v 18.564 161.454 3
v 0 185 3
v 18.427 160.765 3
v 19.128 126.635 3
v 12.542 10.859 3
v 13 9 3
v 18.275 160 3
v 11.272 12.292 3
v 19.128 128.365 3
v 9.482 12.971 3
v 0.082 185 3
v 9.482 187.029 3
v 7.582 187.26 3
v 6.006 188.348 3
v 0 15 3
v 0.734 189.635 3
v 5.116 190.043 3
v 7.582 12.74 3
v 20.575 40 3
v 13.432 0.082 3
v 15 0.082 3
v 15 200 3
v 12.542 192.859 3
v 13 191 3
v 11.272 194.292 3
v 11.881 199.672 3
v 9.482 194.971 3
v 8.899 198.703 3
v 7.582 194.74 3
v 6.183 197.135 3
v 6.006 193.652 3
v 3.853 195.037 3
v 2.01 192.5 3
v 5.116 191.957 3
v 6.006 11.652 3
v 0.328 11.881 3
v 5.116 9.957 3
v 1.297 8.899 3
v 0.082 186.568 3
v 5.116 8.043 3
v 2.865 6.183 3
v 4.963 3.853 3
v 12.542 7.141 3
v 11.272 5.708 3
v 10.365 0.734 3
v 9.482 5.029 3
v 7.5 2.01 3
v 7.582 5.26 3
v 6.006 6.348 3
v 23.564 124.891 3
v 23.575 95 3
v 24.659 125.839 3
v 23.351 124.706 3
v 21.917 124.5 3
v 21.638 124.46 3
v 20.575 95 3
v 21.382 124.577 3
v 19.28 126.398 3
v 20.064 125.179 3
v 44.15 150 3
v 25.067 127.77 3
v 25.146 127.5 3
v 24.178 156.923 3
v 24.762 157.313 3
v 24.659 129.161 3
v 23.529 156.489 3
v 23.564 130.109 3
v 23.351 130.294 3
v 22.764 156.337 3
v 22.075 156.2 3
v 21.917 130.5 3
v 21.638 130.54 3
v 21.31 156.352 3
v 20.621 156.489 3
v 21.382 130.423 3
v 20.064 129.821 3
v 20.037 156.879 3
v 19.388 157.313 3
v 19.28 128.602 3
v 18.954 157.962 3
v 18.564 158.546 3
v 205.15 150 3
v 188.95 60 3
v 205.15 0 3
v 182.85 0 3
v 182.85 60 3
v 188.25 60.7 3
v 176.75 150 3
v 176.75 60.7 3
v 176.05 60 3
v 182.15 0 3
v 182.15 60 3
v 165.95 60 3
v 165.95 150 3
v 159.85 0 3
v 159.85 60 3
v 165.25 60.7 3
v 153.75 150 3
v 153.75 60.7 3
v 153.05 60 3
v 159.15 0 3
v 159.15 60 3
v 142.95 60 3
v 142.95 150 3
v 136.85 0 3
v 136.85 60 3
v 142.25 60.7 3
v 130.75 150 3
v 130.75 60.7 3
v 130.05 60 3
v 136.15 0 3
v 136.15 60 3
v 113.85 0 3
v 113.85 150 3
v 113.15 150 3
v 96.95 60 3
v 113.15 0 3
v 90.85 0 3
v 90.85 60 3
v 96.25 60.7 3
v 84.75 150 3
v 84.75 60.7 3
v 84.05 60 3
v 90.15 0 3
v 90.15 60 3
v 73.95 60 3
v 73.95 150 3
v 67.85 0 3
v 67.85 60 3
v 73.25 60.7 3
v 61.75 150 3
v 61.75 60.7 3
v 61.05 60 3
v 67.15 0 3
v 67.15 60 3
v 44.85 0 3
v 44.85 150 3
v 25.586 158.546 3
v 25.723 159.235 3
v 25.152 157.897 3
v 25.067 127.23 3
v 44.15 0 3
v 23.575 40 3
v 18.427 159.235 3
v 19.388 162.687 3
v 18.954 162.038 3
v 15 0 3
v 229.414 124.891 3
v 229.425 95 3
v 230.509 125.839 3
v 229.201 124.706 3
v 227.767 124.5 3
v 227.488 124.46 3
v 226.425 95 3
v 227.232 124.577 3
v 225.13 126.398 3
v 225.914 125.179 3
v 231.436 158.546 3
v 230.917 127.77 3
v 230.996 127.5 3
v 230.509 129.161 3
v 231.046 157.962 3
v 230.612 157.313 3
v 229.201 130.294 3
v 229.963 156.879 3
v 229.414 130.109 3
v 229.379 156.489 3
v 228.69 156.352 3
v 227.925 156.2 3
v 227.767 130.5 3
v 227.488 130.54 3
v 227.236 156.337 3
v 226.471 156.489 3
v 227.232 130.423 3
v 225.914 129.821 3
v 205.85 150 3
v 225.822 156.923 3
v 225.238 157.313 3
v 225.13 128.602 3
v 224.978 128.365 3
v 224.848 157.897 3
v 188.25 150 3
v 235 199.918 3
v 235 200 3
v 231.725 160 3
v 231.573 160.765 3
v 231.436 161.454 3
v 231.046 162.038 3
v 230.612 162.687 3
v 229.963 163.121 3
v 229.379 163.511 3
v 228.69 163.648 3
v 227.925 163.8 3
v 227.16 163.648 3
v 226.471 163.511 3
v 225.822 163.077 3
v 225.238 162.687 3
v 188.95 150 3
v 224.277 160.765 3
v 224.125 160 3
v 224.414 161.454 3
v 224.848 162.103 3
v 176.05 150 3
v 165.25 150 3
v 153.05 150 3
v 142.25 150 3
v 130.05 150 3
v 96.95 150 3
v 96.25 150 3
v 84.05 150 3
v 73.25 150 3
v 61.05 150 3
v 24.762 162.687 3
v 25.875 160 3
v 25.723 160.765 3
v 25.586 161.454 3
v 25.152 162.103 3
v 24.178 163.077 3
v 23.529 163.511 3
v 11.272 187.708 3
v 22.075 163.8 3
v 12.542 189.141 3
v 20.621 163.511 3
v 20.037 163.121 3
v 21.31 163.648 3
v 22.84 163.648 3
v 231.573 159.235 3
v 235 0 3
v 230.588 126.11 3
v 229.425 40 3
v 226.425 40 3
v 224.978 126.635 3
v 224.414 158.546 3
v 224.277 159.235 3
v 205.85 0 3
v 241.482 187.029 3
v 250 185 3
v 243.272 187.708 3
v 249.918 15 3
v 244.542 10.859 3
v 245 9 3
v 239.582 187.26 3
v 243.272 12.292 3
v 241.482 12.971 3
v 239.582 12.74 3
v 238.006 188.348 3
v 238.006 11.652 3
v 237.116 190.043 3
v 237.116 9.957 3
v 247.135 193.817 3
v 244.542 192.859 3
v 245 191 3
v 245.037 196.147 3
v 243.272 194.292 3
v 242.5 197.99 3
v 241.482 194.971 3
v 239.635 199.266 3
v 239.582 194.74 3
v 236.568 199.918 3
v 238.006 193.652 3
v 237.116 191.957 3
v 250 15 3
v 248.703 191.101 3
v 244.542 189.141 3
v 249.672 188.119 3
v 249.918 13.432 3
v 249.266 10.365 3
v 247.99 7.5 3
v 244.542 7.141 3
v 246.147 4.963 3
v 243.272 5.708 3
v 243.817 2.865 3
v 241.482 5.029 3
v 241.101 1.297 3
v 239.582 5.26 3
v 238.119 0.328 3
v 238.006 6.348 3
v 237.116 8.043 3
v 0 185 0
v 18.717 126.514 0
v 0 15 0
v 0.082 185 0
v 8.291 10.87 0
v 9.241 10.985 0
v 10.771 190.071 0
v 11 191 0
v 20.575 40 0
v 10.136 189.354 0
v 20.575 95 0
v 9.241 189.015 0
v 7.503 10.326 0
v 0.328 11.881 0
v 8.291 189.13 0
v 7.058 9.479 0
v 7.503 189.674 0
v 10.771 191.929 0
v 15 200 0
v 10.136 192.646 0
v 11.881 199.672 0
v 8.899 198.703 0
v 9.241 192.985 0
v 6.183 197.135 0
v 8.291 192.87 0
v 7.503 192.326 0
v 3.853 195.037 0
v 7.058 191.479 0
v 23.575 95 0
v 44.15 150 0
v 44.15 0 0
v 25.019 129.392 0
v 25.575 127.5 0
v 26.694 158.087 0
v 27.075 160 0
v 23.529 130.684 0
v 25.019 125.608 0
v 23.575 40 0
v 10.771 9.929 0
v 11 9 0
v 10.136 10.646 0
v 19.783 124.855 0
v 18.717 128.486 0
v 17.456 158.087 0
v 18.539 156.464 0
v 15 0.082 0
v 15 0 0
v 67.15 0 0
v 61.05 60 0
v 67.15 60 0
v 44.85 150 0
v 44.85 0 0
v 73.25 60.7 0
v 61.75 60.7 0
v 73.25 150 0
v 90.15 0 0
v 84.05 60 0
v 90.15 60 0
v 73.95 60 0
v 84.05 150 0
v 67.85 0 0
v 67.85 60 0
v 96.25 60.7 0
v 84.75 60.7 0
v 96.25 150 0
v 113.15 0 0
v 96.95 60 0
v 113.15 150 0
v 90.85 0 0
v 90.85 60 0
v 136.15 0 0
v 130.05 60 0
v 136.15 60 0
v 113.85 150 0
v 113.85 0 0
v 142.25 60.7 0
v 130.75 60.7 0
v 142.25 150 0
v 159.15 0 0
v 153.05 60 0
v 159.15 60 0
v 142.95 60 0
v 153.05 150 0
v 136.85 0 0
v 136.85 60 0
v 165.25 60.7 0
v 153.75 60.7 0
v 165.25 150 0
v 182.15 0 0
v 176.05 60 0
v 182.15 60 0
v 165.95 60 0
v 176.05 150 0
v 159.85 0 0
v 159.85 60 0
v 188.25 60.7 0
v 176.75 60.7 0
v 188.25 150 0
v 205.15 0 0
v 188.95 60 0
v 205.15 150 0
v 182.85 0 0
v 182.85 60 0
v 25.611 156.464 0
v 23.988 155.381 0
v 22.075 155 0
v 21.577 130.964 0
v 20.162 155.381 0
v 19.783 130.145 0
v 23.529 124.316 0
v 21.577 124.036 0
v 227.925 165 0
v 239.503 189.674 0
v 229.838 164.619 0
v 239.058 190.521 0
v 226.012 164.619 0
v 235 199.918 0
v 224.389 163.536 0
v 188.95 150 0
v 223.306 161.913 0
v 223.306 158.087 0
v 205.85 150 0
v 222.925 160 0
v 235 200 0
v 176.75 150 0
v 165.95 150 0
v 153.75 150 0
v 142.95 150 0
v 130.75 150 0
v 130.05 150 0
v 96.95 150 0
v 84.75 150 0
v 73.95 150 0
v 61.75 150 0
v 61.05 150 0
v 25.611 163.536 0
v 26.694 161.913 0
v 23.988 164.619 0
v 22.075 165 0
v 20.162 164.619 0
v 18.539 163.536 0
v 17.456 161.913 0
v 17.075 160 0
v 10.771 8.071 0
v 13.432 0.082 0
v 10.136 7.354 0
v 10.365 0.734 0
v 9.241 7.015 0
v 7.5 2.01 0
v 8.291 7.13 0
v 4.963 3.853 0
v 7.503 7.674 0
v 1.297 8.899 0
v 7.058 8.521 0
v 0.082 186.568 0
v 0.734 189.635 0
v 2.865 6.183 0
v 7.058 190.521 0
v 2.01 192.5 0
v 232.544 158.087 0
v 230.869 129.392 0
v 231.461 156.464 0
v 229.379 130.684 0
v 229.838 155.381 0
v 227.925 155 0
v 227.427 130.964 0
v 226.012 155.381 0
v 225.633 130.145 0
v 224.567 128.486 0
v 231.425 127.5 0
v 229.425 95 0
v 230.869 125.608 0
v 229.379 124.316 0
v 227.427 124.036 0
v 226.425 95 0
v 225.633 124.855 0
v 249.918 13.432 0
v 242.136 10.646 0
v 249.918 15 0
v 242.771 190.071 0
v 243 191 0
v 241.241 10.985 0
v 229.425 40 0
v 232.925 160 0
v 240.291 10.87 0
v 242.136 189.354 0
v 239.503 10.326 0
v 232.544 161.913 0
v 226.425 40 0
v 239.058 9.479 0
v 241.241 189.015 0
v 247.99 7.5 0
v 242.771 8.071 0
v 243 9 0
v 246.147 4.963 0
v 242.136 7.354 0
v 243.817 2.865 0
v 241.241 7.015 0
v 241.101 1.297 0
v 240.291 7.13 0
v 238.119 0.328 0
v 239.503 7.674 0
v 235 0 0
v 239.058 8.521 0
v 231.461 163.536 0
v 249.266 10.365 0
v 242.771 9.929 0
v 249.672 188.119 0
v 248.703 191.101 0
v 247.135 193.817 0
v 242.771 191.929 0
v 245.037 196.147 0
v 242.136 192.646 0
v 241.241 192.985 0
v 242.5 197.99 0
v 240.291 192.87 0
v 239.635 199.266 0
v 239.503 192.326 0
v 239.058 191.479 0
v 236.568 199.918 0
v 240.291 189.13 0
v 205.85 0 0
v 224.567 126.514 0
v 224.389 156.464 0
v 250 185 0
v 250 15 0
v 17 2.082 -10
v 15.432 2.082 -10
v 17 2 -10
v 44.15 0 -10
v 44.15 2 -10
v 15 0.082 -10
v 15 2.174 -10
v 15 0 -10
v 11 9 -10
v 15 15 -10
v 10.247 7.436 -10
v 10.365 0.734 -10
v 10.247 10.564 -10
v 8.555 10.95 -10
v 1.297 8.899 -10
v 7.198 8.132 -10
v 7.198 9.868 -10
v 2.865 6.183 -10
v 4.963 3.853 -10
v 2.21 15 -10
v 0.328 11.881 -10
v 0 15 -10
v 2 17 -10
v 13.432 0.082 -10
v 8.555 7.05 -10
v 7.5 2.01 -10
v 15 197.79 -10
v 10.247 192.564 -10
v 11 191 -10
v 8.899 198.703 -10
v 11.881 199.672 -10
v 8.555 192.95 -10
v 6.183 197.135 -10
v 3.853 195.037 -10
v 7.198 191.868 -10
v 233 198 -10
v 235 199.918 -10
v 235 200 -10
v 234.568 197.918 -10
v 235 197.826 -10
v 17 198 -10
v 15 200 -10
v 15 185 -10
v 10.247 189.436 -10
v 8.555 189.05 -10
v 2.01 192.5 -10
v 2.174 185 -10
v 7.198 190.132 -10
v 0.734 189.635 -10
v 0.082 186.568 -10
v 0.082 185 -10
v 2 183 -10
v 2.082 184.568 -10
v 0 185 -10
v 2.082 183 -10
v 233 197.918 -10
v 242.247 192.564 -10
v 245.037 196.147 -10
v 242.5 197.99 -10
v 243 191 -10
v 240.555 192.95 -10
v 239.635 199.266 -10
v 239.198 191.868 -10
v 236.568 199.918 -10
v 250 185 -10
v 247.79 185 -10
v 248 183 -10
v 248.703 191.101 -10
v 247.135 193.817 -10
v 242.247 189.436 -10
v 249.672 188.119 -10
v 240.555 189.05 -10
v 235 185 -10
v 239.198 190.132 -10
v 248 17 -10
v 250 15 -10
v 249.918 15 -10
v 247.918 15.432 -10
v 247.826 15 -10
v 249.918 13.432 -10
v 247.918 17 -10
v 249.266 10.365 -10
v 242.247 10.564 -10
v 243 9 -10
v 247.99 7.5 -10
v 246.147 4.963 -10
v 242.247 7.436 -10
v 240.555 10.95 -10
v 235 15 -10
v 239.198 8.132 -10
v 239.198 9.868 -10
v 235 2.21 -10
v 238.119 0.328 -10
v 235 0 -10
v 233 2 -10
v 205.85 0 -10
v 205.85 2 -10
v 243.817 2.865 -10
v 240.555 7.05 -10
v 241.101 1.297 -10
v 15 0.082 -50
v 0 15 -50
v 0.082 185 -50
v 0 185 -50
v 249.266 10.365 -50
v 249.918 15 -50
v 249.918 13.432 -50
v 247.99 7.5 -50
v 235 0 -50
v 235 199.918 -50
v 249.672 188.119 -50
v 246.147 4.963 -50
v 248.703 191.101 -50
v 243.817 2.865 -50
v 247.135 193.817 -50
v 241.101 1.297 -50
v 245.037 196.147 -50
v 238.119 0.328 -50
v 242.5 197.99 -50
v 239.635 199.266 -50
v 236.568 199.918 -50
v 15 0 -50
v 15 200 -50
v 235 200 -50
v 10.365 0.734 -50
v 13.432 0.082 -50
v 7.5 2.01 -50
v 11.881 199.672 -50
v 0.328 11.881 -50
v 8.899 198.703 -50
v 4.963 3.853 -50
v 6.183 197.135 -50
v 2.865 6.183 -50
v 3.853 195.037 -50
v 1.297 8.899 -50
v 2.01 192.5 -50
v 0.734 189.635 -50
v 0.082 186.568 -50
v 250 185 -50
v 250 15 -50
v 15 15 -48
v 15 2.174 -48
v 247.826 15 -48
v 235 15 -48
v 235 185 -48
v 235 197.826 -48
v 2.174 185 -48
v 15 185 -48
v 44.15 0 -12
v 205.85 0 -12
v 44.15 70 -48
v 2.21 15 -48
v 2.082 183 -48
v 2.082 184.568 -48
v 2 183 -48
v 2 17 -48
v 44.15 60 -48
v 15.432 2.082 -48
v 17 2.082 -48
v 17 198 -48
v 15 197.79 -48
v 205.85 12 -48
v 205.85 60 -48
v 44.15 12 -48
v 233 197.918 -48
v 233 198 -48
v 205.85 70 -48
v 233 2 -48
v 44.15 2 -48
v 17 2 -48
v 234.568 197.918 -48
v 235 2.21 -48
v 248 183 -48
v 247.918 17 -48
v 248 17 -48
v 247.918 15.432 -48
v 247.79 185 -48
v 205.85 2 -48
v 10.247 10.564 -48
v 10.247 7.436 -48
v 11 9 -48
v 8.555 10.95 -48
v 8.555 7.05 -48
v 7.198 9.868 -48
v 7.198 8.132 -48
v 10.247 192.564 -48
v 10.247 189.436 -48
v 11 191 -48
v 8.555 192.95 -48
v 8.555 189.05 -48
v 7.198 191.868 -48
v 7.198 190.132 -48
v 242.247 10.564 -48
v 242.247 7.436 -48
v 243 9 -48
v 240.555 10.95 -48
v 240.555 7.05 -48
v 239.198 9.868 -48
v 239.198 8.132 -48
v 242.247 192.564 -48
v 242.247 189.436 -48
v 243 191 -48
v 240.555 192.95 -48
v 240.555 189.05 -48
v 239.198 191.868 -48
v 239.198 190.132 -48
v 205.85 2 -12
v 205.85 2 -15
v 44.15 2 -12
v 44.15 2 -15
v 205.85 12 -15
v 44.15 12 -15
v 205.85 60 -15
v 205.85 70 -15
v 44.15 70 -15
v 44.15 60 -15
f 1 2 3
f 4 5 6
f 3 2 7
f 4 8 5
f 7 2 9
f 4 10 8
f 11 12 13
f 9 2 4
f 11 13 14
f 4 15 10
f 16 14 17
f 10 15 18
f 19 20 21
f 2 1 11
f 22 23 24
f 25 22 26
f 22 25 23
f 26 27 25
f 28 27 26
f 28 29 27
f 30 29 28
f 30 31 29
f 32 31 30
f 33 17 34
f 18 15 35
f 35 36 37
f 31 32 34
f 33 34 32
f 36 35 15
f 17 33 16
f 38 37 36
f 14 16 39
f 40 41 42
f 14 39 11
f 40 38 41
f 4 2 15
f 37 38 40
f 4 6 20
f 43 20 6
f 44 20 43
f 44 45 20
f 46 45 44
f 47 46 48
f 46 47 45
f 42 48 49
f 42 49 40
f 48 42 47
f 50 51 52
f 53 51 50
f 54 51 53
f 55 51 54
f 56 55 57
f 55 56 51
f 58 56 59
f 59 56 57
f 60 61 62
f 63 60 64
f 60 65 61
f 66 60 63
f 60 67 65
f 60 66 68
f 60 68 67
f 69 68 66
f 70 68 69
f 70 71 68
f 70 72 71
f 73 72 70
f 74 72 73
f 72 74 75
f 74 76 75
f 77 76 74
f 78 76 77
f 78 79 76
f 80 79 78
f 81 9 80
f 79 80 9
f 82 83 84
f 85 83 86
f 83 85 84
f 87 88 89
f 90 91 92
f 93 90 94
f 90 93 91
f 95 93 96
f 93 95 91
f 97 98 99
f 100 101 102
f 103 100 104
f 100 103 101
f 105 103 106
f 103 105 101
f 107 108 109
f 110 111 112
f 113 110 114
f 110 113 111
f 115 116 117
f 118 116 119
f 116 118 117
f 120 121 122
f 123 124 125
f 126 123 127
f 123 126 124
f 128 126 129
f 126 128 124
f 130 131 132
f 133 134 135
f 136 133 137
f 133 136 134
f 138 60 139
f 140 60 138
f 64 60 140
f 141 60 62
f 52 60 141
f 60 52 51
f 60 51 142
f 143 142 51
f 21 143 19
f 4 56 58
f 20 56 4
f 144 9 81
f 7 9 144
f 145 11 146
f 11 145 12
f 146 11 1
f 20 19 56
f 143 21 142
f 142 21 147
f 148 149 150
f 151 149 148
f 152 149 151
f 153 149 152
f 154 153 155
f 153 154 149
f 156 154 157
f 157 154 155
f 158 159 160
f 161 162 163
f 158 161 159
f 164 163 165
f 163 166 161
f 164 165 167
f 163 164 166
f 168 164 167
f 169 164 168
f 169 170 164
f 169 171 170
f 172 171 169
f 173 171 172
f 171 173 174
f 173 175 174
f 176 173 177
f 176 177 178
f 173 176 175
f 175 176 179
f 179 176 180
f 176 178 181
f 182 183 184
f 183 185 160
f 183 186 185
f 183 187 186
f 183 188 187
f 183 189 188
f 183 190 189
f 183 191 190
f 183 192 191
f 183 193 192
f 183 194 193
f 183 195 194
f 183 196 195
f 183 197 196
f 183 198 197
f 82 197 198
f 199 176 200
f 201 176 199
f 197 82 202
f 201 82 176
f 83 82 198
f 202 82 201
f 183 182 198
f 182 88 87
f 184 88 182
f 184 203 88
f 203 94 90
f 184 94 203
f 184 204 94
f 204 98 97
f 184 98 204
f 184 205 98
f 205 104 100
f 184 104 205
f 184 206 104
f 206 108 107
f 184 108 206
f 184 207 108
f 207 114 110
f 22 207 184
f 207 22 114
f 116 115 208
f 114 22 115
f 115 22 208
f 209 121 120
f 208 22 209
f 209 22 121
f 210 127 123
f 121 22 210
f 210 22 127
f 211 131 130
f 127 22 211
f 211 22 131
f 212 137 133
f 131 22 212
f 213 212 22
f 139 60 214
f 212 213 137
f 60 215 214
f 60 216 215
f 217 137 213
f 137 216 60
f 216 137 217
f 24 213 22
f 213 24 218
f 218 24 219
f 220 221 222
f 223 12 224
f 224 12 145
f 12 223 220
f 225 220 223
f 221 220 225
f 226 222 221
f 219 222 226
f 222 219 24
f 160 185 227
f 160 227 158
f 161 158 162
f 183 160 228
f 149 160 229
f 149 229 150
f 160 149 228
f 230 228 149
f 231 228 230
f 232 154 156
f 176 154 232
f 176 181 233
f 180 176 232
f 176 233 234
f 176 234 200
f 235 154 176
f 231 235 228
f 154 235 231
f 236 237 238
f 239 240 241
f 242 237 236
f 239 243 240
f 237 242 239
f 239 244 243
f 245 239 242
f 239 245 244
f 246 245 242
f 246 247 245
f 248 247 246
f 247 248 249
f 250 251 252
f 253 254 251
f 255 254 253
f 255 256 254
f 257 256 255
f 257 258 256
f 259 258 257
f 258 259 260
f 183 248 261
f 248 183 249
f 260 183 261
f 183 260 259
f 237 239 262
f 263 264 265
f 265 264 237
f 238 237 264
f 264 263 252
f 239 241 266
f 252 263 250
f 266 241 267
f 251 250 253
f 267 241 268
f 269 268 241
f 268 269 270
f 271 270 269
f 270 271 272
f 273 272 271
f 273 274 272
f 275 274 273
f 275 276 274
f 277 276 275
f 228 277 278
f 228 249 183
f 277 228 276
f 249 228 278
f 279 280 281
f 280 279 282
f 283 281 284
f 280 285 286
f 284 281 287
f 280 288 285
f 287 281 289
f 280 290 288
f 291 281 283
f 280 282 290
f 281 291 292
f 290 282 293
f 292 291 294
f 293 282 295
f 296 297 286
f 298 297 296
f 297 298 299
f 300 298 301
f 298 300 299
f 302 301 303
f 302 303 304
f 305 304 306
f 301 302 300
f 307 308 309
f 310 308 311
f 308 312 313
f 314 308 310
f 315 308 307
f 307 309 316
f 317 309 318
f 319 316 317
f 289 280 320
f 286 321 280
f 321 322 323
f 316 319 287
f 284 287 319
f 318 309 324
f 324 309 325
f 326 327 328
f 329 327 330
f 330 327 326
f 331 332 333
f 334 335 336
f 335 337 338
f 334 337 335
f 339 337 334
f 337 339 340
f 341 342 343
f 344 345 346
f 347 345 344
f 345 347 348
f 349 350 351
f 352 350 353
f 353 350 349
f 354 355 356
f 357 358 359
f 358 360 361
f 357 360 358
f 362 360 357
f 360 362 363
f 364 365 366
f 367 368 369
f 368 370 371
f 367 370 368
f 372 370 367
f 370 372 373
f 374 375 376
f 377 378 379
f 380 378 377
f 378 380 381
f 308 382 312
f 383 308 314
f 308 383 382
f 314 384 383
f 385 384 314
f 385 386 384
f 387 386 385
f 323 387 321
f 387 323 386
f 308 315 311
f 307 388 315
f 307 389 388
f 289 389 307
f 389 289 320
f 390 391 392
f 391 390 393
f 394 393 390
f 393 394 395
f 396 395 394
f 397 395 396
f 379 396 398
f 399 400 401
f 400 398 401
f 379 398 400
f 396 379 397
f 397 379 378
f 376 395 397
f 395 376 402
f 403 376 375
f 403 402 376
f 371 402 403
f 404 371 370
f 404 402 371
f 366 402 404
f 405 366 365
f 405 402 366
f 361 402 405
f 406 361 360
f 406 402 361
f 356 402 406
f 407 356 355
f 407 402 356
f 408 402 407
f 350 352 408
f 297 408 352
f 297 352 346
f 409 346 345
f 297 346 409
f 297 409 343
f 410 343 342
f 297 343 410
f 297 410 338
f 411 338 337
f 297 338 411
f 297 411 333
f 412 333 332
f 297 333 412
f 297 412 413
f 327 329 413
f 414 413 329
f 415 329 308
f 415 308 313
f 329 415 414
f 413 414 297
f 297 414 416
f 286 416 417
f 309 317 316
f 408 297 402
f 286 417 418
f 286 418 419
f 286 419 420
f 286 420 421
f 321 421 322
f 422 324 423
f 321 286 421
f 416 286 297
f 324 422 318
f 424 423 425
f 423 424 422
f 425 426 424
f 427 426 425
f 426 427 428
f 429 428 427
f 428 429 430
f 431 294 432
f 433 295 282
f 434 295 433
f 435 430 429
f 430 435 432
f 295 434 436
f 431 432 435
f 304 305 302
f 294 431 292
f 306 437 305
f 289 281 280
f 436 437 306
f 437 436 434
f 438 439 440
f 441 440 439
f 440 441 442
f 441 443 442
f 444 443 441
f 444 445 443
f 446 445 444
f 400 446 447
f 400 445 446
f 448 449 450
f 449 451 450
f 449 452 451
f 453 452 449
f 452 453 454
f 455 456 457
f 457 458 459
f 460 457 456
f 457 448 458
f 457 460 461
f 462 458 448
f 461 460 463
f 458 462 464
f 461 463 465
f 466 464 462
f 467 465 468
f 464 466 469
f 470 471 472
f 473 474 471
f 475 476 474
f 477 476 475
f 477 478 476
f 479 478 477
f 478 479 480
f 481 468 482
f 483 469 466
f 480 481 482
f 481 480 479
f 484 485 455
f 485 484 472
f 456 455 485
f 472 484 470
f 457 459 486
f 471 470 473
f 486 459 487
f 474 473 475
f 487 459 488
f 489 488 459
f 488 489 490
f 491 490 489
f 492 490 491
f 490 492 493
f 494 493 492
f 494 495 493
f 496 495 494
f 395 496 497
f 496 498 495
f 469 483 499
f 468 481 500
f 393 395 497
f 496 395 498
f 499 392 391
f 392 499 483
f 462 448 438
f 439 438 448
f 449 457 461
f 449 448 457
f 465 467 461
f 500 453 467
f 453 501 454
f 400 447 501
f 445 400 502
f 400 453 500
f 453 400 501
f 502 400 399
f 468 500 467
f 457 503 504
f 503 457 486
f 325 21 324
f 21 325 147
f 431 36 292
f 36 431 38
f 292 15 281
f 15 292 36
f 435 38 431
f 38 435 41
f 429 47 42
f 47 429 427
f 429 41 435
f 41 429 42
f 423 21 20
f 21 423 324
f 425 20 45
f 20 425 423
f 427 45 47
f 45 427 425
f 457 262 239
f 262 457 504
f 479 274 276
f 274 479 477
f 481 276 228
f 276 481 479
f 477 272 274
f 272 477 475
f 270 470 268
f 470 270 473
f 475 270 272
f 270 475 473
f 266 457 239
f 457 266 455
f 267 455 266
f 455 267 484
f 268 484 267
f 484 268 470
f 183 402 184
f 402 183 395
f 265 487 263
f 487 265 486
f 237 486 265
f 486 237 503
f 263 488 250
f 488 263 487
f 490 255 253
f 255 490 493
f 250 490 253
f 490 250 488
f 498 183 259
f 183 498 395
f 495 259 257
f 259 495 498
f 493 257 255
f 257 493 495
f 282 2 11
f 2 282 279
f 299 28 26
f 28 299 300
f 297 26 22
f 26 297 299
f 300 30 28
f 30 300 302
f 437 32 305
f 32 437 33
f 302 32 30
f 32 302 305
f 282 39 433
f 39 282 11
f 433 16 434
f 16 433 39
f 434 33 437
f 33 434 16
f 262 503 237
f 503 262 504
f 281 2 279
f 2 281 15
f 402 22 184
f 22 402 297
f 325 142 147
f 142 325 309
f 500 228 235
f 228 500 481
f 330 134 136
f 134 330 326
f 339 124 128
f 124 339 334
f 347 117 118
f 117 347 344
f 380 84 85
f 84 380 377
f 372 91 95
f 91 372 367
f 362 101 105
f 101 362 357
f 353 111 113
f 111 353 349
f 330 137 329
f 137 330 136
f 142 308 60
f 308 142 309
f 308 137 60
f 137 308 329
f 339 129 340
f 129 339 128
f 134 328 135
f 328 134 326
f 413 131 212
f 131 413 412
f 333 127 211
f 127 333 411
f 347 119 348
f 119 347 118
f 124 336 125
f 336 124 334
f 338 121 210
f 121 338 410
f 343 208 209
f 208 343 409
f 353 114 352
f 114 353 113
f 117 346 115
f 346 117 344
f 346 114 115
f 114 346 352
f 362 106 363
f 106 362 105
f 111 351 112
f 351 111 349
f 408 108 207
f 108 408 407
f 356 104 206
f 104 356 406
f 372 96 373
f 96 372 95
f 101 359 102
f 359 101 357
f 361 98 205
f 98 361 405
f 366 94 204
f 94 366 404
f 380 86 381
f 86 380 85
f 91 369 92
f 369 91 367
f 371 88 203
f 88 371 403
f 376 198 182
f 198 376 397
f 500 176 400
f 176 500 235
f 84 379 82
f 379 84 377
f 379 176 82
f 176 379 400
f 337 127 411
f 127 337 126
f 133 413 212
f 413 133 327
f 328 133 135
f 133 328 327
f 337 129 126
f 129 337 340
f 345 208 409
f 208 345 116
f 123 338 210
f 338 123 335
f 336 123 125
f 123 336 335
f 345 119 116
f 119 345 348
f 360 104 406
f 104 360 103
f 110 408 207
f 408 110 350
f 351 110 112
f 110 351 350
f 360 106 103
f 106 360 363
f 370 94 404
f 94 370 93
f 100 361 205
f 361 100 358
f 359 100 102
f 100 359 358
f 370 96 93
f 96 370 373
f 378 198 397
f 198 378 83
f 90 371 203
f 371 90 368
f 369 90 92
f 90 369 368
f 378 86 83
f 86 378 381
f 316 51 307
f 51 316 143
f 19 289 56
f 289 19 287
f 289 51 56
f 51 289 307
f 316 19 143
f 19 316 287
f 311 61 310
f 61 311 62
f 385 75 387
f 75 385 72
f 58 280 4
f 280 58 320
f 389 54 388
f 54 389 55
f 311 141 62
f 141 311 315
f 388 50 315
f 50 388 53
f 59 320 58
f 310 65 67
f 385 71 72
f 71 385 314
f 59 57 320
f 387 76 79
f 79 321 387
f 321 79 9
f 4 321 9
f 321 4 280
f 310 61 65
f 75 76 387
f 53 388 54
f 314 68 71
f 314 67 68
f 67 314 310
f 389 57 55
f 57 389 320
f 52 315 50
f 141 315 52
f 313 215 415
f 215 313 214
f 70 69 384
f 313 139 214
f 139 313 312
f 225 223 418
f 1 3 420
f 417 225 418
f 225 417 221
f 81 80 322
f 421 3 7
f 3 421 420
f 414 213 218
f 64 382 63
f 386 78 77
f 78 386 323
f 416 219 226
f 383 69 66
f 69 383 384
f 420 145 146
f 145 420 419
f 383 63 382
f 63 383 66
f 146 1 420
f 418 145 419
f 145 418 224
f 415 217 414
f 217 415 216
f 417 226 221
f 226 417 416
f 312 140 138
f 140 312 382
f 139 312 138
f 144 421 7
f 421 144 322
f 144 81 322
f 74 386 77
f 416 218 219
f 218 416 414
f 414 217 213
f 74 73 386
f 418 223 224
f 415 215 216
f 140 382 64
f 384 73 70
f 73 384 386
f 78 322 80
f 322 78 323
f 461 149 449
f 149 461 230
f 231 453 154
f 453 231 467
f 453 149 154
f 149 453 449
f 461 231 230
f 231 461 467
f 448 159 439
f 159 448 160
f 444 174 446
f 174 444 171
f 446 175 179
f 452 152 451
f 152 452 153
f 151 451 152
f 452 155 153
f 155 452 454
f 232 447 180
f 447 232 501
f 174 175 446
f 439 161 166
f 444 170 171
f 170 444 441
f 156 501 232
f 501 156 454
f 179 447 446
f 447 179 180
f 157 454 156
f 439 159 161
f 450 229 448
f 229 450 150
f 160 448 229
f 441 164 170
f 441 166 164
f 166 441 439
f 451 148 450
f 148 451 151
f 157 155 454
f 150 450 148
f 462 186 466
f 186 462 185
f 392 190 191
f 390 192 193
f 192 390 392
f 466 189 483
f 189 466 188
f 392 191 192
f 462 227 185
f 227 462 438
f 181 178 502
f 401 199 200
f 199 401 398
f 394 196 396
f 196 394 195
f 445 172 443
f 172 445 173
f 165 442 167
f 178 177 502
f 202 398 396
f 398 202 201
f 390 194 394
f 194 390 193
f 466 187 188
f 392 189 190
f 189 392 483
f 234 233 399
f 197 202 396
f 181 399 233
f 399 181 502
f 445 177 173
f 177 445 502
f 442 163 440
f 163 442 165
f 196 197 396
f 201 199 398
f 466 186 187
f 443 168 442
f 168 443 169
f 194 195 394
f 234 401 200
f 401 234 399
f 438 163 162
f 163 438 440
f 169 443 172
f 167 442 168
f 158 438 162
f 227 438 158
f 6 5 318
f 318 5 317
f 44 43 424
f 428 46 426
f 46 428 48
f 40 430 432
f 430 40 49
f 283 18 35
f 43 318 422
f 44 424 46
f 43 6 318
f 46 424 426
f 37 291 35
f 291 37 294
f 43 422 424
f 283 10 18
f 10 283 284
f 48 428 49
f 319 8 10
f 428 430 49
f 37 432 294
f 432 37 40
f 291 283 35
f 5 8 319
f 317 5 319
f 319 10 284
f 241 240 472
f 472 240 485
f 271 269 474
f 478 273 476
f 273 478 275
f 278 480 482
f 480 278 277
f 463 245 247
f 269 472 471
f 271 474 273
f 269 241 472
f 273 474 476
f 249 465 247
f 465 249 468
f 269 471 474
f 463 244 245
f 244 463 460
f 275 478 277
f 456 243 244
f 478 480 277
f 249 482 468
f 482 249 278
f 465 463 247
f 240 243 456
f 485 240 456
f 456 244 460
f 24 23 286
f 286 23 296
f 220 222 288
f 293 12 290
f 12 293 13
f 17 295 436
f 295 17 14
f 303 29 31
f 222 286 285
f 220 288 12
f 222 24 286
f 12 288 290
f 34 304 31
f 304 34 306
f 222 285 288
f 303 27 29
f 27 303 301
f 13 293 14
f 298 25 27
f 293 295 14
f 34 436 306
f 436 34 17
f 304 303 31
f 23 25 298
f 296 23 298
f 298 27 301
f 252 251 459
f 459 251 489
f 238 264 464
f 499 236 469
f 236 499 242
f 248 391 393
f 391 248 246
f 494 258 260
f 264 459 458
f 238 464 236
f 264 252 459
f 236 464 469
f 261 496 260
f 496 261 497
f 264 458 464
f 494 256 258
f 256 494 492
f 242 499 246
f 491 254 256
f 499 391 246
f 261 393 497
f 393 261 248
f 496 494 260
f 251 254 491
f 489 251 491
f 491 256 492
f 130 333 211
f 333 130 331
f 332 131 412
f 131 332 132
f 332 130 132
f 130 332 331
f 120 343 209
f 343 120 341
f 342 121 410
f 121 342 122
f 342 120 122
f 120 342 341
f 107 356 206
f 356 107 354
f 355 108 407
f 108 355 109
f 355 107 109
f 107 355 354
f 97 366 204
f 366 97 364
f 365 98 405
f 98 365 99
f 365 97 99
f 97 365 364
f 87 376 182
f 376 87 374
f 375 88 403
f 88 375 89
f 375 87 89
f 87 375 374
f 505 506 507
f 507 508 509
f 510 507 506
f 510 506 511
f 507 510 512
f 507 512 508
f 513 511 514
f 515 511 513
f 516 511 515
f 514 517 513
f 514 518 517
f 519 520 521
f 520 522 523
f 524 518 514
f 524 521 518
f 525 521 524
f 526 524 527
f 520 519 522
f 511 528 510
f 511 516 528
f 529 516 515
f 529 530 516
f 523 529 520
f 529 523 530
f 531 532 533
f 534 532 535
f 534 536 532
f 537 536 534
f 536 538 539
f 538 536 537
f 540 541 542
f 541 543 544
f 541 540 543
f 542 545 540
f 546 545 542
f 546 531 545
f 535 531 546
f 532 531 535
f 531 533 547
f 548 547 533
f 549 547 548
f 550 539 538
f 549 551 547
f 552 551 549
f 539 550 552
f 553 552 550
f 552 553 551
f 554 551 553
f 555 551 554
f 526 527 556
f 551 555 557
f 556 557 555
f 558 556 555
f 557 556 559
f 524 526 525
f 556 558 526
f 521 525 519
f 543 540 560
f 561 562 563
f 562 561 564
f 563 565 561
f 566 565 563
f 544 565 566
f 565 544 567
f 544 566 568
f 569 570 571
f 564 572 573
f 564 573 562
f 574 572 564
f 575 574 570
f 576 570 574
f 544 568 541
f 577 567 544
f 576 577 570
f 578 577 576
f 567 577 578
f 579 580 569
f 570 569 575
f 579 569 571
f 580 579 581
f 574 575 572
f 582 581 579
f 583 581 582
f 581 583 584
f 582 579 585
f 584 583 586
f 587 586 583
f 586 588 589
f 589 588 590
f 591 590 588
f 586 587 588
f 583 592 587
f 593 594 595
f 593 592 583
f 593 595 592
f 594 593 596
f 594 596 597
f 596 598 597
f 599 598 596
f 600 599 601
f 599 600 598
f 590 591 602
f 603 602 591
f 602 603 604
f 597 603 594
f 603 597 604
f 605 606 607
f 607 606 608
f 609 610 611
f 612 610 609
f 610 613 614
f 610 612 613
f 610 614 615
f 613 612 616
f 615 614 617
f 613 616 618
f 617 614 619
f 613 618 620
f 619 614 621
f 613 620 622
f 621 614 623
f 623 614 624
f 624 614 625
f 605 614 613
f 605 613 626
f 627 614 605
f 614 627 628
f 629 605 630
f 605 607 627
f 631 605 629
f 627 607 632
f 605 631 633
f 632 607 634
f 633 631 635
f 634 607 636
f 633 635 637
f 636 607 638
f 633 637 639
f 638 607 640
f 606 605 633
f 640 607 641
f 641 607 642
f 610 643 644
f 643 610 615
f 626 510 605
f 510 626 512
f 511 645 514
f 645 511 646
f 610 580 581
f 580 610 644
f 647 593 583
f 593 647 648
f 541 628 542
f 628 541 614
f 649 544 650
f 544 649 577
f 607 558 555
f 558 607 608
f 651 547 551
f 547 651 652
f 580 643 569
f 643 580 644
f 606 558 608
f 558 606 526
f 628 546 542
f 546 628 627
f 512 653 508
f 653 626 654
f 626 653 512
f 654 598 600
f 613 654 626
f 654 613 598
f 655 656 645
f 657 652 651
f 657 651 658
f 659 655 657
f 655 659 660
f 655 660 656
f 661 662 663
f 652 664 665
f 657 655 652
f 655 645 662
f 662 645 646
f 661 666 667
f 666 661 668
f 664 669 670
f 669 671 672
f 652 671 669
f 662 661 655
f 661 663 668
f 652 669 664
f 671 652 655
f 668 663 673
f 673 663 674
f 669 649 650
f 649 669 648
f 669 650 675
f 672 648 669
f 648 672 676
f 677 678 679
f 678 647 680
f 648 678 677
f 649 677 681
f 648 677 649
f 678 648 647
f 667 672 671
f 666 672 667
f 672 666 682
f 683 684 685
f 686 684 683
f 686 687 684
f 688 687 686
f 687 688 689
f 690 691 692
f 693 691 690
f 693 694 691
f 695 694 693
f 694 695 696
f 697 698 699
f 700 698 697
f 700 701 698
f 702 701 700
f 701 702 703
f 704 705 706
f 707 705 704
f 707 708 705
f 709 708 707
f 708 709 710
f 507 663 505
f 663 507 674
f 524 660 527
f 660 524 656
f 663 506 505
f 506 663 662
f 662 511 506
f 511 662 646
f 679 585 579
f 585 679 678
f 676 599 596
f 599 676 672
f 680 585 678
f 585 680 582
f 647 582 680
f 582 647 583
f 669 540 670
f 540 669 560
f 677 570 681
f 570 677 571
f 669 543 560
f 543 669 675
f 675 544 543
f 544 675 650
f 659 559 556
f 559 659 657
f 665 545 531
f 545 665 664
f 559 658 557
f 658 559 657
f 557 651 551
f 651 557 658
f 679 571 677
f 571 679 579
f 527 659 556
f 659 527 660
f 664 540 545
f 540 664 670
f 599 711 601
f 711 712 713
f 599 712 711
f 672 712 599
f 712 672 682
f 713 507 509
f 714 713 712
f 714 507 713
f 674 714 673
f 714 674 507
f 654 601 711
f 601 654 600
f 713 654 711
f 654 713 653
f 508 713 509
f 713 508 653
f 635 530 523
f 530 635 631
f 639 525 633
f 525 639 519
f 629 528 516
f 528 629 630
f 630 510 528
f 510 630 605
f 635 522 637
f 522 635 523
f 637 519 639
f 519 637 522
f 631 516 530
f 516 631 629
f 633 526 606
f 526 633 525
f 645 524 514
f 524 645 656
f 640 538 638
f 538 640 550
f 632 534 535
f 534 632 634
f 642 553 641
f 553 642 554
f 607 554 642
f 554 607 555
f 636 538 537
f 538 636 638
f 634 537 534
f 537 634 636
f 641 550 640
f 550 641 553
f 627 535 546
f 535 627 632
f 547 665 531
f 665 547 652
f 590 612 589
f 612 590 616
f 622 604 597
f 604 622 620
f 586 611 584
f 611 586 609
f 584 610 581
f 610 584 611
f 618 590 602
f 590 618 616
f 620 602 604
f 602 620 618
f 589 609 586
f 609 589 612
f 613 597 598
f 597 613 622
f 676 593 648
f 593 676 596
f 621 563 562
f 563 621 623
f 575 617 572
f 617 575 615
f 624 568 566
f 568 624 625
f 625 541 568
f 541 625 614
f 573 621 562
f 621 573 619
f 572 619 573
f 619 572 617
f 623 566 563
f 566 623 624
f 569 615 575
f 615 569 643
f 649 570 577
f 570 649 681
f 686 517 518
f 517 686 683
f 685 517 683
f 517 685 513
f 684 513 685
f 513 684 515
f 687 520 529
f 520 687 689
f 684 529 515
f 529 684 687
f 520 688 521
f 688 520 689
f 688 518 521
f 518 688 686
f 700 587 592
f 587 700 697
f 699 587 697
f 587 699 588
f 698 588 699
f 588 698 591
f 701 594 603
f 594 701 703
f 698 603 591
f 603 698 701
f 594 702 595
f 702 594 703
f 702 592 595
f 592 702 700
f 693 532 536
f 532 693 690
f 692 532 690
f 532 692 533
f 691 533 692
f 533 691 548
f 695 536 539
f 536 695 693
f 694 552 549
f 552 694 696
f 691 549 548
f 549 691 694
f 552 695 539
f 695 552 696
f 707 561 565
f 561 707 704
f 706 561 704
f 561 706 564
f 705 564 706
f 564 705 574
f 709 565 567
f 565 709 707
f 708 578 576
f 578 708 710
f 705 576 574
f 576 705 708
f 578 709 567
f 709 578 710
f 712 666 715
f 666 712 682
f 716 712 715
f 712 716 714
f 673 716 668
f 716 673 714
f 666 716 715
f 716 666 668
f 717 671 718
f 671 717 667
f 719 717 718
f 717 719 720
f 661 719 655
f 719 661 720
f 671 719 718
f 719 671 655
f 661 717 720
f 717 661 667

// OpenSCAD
//width
w = 250;
//height (y)
h = 200;
//depth (z)
d = 40;
//strength (thickness of outer walls)
s = 2;

//radius of edges
r = 15;

//screw holder width
sm = 8;
//hole radius
hr = 2;

//key width
kw = 23;
//key length
kl = 150;
//small key length
skl = 90;
//key gap
kg = 0.7;
//key depth (depth of upper plate
kd = 3;

slider_length = 55;

slider_y = 40;
knob_y = (h+slider_length)/2;
knob2_y = h-40;



//margin of keys begin
center_keys_margin = (w-(7*kw)-kg)/2;


//push button height
pbh = 5;

//include <roundedcube.scad>

module myroundedcube(size=[1,1,1],radius=0.5) {
    difference(){    
    cube(size);
    
        translate([radius,radius,0])rotate([0,0,180])difference(){
                cube([radius*2,radius*2,size[2]]);
                cylinder(size[2],radius,radius);
        }
        translate([size[0]-radius,radius,0])rotate([0,0,270])difference(){
                cube([radius*2,radius*2,size[2]]);
                cylinder(size[2],radius,radius);
        }
        translate([size[0]-radius,size[1]-radius,0])rotate([0,0,0])difference(){
                cube([radius*2,radius*2,size[2]]);
                cylinder(size[2],radius,radius);
        }
        translate([radius,size[1]-radius,0])rotate([0,0,90])difference(){
                cube([radius*2,radius*2,size[2]]);
                cylinder(size[2],radius,radius);
        }
        }
        
}


difference(){
//upper plate
myroundedcube([w,h,kd],radius=r);

//cut off big keys
for(i = [0:7])
    translate([center_keys_margin+i*kw,0,0])cube([kg,kl,kd]);

//cut holes for small keys
for(i = [1,2,4,5,6])
    translate([center_keys_margin+i*kw-(kw+2*kg)/4,kl-skl,0])cube([kw/2+2*kg,skl,kd]);


translate([center_keys_margin/2-1.5,slider_y,0]) cube([3,slider_length,kd]);
translate([center_keys_margin/2,knob_y,0]) cylinder(3.5,3.5,kd);
translate([center_keys_margin/2,knob2_y,0]) cylinder(5,5,kd);

translate([w-center_keys_margin/2-1.5,slider_y,0]) cube([3,55,kd]);
translate([w-center_keys_margin/2,knob_y,0]) cylinder(3.5,3.5,kd);
translate([w-center_keys_margin/2,knob2_y,0]) cylinder(5,5,kd);

//holes at the edges
        translate([r*0.6,r*0.6,0])cylinder(kd,hr,hr*2);
        translate([w-r+r*0.4,r*0.6,0])cylinder(kd,hr,hr*2);
        translate([r*0.6,h-r+r*0.4,0])cylinder(kd,hr,hr*2);
        translate([w-r+r*0.4,h-r+r*0.4,0])cylinder(kd,hr,hr*2);

        

}//difference

//small keys
for(i = [1,2,4,5,6])
    translate([center_keys_margin+i*kw-(kw-2*kg)/4,kl-skl+kg,0]) cube([kw/2,skl-kg,kd]);


//bottom
translate([0,0,-d-10]){
    difference(){
        union(){
            myroundedcube([w,h,d],radius=r);
        }
            translate([s,s,s])myroundedcube([w-2*s,h-2*s,d-s],radius=r);
            translate([center_keys_margin,0,d-s]) cube([7*kw+kg,s,s]);
    }
    difference(){
        union(){
            intersection(){translate([r,r,0])cylinder(d,r,r);cube([r,r,d]);}
            translate([0,h,0])rotate([0,0,270])intersection(){translate([r,r,0])cylinder(d,r,r);cube([r,r,d]);}
            translate([w,0,0])rotate([0,0,90])intersection(){translate([r,r,0])cylinder(d,r,r);cube([r,r,d]);}
            translate([w,h,0])rotate([0,0,180])intersection(){translate([r,r,0])cylinder(d,r,r);cube([r,r,d]);}
        }
        translate([r*0.6,r*0.6,0])cylinder(d,hr,hr);
        translate([w-r+r*0.4,r*0.6,0])cylinder(d,hr,hr);
        translate([r*0.6,h-r+r*0.4,0])cylinder(d,hr,hr);
        translate([w-r+r*0.4,h-r+r*0.4,0])cylinder(d,hr,hr);
        
        
        
    }
    
    translate([center_keys_margin,s,0]) cube([7*kw+kg,10,d-pbh]);
    translate([center_keys_margin,kl-skl,0]) cube([7*kw+kg,10,d-pbh]);

    
}
